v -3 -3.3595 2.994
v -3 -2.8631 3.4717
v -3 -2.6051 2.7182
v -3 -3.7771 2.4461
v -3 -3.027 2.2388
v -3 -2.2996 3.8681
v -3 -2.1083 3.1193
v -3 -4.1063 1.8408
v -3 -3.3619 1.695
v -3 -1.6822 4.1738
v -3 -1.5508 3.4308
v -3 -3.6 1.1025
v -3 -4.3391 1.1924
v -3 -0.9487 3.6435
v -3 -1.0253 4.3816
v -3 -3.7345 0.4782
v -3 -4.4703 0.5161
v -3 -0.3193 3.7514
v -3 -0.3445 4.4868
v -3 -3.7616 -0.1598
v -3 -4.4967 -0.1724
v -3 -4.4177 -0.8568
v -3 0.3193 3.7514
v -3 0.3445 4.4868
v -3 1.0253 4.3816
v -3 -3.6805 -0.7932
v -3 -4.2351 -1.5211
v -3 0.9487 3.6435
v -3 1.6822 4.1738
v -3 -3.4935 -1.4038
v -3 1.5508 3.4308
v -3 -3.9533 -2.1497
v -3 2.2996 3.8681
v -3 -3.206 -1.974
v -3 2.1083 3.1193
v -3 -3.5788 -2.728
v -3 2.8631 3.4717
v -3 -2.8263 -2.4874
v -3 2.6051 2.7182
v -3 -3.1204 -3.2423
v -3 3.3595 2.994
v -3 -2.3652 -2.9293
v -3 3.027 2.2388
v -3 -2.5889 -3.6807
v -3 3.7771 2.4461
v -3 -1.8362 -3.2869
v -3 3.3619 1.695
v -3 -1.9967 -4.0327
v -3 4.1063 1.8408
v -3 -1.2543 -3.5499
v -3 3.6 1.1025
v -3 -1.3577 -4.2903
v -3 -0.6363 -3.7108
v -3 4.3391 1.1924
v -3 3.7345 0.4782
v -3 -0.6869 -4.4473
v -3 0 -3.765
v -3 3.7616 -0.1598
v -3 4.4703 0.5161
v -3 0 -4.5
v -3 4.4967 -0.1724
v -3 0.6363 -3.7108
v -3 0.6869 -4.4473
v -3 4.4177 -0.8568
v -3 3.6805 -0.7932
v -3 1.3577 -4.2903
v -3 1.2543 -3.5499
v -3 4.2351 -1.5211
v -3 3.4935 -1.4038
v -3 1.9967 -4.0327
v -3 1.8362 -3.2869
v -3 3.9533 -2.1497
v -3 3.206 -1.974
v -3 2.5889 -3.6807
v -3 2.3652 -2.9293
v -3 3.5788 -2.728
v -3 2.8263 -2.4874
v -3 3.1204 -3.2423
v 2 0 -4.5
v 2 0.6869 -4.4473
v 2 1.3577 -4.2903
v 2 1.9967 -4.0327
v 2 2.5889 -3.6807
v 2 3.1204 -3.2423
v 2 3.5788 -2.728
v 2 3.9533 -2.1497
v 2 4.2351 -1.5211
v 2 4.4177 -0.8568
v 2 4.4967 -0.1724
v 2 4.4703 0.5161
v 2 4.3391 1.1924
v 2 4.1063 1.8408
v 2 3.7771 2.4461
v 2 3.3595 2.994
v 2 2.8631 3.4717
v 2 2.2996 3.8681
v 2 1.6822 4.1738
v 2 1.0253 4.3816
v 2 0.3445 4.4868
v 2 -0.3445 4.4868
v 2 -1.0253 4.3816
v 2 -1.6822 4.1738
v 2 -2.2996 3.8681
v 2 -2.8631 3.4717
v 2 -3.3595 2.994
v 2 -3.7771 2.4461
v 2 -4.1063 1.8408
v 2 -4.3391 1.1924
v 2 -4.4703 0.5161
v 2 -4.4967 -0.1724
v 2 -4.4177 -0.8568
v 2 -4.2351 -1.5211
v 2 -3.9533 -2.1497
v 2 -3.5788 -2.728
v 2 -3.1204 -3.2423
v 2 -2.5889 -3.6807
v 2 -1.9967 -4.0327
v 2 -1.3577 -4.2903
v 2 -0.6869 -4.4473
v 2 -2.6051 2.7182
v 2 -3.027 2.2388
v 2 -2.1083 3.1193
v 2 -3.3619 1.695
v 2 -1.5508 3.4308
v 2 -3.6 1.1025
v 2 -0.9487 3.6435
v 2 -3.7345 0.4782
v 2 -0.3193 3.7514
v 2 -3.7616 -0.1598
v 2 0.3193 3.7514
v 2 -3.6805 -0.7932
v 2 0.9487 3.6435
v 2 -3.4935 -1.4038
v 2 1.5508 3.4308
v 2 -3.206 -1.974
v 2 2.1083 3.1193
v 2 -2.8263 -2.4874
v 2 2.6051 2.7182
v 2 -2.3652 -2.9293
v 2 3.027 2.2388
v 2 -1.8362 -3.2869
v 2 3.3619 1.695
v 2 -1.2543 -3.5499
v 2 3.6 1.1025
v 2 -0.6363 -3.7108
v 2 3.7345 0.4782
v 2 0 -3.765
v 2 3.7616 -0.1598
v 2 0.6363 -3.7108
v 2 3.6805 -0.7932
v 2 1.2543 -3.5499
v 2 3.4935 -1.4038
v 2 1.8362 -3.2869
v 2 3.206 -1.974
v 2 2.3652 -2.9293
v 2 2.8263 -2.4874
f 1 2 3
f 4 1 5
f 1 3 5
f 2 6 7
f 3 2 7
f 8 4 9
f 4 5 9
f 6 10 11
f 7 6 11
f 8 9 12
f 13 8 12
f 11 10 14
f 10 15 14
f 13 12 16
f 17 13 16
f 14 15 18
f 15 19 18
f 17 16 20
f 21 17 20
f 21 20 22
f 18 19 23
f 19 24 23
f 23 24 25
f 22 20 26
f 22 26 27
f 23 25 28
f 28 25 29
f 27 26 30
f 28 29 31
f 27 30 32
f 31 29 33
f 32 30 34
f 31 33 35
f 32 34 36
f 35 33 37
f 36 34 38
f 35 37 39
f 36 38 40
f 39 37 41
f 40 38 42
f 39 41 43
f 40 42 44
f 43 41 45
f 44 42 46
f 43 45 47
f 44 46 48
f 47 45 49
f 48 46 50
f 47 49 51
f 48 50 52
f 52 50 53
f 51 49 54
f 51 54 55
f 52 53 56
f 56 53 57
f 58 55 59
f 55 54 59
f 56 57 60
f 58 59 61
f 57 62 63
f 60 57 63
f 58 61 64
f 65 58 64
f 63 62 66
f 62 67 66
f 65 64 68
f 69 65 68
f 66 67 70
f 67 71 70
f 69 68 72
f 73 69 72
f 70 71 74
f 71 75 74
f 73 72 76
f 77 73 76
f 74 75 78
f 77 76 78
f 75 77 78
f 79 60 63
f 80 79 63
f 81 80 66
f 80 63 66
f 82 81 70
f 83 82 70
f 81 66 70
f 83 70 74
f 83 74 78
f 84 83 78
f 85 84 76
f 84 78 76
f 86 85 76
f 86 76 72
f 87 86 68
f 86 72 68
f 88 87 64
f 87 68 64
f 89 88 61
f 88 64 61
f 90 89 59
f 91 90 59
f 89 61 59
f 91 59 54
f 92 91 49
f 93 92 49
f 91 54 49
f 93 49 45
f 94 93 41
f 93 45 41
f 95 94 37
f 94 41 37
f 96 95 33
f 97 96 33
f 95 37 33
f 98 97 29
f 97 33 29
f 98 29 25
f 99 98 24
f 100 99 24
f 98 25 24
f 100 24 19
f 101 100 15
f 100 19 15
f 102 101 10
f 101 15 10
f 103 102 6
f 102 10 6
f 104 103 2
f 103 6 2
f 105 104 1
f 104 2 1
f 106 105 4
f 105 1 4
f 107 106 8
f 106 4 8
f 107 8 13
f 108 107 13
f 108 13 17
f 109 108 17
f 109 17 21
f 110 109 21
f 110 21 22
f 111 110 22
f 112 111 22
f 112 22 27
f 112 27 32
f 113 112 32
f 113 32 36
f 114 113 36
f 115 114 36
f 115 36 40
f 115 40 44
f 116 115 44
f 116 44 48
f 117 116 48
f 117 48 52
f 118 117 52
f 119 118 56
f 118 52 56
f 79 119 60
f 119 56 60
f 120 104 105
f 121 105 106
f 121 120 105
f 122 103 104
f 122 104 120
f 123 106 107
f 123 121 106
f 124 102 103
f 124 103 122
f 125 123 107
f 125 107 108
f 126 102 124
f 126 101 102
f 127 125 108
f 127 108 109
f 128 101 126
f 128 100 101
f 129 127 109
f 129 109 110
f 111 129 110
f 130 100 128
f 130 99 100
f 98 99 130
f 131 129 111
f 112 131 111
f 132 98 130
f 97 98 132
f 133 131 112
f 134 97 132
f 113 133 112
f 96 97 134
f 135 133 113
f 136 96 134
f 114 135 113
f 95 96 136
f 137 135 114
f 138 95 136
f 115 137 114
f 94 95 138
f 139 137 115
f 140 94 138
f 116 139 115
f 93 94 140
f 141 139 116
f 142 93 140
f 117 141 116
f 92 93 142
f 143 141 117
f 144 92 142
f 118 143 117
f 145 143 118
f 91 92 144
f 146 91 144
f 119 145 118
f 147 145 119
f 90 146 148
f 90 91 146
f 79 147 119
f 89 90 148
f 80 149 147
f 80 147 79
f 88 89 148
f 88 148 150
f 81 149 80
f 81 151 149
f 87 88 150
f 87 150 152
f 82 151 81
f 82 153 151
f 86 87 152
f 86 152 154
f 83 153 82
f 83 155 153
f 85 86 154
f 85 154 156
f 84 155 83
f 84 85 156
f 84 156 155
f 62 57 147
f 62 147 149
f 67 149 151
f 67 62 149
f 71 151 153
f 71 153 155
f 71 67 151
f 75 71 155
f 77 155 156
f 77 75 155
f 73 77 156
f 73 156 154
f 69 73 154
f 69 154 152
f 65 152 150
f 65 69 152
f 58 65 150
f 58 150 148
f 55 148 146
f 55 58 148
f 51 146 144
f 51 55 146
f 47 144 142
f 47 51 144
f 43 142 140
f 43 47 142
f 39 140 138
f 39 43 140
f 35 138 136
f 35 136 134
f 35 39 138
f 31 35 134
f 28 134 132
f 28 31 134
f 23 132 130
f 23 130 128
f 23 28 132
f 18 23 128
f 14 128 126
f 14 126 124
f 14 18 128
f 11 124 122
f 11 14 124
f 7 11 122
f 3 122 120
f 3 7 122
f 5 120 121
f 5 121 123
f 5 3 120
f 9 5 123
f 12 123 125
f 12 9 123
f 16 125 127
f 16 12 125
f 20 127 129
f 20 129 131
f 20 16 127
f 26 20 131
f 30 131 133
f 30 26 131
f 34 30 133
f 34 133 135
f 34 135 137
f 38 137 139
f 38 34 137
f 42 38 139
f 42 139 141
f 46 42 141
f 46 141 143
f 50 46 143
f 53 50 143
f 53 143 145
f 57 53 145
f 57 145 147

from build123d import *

# Parameters (mm, degrees)
CYLINDER_R          = 3.765
CYLINDER_DEPTH      = 5
CYLINDER001_R       = 4.5
CYLINDER001_DEPTH   = 5
CUT_PLACEMENT_ANGLE = 90


with BuildPart() as cylinder:
    # Cylinder → Cylinder (new body)
    with BuildSketch(Plane.XY.offset(10)):
        Circle(CYLINDER_R)
    extrude(amount=CYLINDER_DEPTH)


with BuildPart() as empalme:
    # Cylinder001 → Cylinder001 (new body)
    with BuildSketch(Plane.XY.offset(10)):
        Circle(CYLINDER001_R)
    extrude(amount=CYLINDER001_DEPTH)

    # Cut: cut Cylinder
    add(cylinder.part, mode=Mode.SUBTRACT)


with BuildPart() as empalme_1:
    # Cut placement: moved
    add(empalme.part.moved(Location((-13, 0, 0))).rotate(Axis((-13, 0, 0), (0, 1, 0)), CUT_PLACEMENT_ANGLE))


solid = empalme_1.part
